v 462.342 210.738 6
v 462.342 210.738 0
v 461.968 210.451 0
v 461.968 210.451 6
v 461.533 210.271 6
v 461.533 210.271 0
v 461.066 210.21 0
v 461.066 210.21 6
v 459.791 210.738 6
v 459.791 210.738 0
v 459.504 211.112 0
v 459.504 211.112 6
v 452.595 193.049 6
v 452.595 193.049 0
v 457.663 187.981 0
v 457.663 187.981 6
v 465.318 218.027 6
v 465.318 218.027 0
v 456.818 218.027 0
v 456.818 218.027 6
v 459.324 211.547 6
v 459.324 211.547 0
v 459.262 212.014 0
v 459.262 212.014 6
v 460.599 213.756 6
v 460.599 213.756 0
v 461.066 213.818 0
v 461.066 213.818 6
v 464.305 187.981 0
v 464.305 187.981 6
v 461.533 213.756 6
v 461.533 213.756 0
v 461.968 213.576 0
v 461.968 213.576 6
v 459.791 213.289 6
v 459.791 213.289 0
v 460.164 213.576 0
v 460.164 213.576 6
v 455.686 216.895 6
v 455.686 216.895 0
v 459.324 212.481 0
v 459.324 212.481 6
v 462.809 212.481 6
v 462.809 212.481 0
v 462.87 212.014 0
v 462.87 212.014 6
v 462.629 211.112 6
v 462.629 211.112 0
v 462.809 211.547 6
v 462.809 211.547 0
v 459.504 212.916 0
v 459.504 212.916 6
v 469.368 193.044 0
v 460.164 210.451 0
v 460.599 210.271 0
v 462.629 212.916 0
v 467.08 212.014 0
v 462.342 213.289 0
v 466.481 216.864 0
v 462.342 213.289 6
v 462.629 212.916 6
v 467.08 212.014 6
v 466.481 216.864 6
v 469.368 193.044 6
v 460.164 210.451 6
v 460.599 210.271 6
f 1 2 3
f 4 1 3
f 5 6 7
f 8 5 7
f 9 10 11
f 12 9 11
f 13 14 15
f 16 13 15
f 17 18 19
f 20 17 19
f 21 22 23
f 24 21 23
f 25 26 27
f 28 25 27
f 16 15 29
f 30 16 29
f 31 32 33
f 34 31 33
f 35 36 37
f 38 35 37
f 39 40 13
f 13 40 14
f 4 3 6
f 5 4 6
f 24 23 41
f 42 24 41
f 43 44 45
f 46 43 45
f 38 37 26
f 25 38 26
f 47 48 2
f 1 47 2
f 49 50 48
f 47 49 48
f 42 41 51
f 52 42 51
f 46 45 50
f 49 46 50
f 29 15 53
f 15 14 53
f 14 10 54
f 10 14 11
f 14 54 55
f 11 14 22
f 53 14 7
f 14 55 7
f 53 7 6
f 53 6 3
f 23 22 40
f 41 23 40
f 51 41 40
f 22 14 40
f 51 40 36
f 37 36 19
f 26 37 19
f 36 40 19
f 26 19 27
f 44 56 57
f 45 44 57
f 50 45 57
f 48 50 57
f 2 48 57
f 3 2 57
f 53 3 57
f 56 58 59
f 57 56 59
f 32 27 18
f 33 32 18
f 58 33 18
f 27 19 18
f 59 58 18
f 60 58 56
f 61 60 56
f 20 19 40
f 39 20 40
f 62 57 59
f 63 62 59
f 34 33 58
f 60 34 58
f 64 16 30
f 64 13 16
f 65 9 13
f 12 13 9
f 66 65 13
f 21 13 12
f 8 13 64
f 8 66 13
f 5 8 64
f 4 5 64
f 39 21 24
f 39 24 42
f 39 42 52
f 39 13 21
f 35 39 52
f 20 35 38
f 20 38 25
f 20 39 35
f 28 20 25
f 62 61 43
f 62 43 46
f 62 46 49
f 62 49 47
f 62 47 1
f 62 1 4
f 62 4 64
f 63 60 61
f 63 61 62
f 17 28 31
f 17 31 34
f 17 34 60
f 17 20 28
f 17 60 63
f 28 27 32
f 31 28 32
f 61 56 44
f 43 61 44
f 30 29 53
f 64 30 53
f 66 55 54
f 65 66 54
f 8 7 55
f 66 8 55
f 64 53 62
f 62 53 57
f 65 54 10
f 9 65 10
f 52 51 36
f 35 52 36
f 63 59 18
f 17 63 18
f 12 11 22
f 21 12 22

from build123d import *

# Parameters (mm, degrees)
BOSS_EXTRUDE1_DEPTH = 6


with BuildPart() as part:
    # Sketch1 → Boss-Extrude1 (new body)
    with BuildSketch(Plane.XY):
        Polygon((457.663031463, 187.980636569), (464.304980239, 187.980636569), (469.367845751, 193.043502081), (467.079834781, 212.013718005), (466.481000515, 216.863814529), (465.31762376, 218.027191284), (456.81762376, 218.027191284), (455.685560331, 216.895127855), (452.59487335, 193.048794682), align=None)
        Polygon((461.066361502, 210.209676022), (460.599441079, 210.271147261), (460.16434051, 210.451371818), (459.790711182, 210.738067685), (459.504015315, 211.111697013), (459.323790759, 211.546797582), (459.262319519, 212.013718005), (459.323790759, 212.480638429), (459.504015315, 212.915738997), (459.790711182, 213.289368326), (460.16434051, 213.576064193), (460.599441079, 213.756288749), (461.066361502, 213.817759989), (461.533281926, 213.756288749), (461.968382494, 213.576064193), (462.342011823, 213.289368326), (462.62870769, 212.915738997), (462.808932246, 212.480638429), (462.870403486, 212.013718005), (462.808932246, 211.546797582), (462.62870769, 211.111697013), (462.342011823, 210.738067685), (461.968382494, 210.451371818), (461.533281926, 210.271147261), align=None, mode=Mode.SUBTRACT)
    extrude(amount=BOSS_EXTRUDE1_DEPTH)


solid = part.part
